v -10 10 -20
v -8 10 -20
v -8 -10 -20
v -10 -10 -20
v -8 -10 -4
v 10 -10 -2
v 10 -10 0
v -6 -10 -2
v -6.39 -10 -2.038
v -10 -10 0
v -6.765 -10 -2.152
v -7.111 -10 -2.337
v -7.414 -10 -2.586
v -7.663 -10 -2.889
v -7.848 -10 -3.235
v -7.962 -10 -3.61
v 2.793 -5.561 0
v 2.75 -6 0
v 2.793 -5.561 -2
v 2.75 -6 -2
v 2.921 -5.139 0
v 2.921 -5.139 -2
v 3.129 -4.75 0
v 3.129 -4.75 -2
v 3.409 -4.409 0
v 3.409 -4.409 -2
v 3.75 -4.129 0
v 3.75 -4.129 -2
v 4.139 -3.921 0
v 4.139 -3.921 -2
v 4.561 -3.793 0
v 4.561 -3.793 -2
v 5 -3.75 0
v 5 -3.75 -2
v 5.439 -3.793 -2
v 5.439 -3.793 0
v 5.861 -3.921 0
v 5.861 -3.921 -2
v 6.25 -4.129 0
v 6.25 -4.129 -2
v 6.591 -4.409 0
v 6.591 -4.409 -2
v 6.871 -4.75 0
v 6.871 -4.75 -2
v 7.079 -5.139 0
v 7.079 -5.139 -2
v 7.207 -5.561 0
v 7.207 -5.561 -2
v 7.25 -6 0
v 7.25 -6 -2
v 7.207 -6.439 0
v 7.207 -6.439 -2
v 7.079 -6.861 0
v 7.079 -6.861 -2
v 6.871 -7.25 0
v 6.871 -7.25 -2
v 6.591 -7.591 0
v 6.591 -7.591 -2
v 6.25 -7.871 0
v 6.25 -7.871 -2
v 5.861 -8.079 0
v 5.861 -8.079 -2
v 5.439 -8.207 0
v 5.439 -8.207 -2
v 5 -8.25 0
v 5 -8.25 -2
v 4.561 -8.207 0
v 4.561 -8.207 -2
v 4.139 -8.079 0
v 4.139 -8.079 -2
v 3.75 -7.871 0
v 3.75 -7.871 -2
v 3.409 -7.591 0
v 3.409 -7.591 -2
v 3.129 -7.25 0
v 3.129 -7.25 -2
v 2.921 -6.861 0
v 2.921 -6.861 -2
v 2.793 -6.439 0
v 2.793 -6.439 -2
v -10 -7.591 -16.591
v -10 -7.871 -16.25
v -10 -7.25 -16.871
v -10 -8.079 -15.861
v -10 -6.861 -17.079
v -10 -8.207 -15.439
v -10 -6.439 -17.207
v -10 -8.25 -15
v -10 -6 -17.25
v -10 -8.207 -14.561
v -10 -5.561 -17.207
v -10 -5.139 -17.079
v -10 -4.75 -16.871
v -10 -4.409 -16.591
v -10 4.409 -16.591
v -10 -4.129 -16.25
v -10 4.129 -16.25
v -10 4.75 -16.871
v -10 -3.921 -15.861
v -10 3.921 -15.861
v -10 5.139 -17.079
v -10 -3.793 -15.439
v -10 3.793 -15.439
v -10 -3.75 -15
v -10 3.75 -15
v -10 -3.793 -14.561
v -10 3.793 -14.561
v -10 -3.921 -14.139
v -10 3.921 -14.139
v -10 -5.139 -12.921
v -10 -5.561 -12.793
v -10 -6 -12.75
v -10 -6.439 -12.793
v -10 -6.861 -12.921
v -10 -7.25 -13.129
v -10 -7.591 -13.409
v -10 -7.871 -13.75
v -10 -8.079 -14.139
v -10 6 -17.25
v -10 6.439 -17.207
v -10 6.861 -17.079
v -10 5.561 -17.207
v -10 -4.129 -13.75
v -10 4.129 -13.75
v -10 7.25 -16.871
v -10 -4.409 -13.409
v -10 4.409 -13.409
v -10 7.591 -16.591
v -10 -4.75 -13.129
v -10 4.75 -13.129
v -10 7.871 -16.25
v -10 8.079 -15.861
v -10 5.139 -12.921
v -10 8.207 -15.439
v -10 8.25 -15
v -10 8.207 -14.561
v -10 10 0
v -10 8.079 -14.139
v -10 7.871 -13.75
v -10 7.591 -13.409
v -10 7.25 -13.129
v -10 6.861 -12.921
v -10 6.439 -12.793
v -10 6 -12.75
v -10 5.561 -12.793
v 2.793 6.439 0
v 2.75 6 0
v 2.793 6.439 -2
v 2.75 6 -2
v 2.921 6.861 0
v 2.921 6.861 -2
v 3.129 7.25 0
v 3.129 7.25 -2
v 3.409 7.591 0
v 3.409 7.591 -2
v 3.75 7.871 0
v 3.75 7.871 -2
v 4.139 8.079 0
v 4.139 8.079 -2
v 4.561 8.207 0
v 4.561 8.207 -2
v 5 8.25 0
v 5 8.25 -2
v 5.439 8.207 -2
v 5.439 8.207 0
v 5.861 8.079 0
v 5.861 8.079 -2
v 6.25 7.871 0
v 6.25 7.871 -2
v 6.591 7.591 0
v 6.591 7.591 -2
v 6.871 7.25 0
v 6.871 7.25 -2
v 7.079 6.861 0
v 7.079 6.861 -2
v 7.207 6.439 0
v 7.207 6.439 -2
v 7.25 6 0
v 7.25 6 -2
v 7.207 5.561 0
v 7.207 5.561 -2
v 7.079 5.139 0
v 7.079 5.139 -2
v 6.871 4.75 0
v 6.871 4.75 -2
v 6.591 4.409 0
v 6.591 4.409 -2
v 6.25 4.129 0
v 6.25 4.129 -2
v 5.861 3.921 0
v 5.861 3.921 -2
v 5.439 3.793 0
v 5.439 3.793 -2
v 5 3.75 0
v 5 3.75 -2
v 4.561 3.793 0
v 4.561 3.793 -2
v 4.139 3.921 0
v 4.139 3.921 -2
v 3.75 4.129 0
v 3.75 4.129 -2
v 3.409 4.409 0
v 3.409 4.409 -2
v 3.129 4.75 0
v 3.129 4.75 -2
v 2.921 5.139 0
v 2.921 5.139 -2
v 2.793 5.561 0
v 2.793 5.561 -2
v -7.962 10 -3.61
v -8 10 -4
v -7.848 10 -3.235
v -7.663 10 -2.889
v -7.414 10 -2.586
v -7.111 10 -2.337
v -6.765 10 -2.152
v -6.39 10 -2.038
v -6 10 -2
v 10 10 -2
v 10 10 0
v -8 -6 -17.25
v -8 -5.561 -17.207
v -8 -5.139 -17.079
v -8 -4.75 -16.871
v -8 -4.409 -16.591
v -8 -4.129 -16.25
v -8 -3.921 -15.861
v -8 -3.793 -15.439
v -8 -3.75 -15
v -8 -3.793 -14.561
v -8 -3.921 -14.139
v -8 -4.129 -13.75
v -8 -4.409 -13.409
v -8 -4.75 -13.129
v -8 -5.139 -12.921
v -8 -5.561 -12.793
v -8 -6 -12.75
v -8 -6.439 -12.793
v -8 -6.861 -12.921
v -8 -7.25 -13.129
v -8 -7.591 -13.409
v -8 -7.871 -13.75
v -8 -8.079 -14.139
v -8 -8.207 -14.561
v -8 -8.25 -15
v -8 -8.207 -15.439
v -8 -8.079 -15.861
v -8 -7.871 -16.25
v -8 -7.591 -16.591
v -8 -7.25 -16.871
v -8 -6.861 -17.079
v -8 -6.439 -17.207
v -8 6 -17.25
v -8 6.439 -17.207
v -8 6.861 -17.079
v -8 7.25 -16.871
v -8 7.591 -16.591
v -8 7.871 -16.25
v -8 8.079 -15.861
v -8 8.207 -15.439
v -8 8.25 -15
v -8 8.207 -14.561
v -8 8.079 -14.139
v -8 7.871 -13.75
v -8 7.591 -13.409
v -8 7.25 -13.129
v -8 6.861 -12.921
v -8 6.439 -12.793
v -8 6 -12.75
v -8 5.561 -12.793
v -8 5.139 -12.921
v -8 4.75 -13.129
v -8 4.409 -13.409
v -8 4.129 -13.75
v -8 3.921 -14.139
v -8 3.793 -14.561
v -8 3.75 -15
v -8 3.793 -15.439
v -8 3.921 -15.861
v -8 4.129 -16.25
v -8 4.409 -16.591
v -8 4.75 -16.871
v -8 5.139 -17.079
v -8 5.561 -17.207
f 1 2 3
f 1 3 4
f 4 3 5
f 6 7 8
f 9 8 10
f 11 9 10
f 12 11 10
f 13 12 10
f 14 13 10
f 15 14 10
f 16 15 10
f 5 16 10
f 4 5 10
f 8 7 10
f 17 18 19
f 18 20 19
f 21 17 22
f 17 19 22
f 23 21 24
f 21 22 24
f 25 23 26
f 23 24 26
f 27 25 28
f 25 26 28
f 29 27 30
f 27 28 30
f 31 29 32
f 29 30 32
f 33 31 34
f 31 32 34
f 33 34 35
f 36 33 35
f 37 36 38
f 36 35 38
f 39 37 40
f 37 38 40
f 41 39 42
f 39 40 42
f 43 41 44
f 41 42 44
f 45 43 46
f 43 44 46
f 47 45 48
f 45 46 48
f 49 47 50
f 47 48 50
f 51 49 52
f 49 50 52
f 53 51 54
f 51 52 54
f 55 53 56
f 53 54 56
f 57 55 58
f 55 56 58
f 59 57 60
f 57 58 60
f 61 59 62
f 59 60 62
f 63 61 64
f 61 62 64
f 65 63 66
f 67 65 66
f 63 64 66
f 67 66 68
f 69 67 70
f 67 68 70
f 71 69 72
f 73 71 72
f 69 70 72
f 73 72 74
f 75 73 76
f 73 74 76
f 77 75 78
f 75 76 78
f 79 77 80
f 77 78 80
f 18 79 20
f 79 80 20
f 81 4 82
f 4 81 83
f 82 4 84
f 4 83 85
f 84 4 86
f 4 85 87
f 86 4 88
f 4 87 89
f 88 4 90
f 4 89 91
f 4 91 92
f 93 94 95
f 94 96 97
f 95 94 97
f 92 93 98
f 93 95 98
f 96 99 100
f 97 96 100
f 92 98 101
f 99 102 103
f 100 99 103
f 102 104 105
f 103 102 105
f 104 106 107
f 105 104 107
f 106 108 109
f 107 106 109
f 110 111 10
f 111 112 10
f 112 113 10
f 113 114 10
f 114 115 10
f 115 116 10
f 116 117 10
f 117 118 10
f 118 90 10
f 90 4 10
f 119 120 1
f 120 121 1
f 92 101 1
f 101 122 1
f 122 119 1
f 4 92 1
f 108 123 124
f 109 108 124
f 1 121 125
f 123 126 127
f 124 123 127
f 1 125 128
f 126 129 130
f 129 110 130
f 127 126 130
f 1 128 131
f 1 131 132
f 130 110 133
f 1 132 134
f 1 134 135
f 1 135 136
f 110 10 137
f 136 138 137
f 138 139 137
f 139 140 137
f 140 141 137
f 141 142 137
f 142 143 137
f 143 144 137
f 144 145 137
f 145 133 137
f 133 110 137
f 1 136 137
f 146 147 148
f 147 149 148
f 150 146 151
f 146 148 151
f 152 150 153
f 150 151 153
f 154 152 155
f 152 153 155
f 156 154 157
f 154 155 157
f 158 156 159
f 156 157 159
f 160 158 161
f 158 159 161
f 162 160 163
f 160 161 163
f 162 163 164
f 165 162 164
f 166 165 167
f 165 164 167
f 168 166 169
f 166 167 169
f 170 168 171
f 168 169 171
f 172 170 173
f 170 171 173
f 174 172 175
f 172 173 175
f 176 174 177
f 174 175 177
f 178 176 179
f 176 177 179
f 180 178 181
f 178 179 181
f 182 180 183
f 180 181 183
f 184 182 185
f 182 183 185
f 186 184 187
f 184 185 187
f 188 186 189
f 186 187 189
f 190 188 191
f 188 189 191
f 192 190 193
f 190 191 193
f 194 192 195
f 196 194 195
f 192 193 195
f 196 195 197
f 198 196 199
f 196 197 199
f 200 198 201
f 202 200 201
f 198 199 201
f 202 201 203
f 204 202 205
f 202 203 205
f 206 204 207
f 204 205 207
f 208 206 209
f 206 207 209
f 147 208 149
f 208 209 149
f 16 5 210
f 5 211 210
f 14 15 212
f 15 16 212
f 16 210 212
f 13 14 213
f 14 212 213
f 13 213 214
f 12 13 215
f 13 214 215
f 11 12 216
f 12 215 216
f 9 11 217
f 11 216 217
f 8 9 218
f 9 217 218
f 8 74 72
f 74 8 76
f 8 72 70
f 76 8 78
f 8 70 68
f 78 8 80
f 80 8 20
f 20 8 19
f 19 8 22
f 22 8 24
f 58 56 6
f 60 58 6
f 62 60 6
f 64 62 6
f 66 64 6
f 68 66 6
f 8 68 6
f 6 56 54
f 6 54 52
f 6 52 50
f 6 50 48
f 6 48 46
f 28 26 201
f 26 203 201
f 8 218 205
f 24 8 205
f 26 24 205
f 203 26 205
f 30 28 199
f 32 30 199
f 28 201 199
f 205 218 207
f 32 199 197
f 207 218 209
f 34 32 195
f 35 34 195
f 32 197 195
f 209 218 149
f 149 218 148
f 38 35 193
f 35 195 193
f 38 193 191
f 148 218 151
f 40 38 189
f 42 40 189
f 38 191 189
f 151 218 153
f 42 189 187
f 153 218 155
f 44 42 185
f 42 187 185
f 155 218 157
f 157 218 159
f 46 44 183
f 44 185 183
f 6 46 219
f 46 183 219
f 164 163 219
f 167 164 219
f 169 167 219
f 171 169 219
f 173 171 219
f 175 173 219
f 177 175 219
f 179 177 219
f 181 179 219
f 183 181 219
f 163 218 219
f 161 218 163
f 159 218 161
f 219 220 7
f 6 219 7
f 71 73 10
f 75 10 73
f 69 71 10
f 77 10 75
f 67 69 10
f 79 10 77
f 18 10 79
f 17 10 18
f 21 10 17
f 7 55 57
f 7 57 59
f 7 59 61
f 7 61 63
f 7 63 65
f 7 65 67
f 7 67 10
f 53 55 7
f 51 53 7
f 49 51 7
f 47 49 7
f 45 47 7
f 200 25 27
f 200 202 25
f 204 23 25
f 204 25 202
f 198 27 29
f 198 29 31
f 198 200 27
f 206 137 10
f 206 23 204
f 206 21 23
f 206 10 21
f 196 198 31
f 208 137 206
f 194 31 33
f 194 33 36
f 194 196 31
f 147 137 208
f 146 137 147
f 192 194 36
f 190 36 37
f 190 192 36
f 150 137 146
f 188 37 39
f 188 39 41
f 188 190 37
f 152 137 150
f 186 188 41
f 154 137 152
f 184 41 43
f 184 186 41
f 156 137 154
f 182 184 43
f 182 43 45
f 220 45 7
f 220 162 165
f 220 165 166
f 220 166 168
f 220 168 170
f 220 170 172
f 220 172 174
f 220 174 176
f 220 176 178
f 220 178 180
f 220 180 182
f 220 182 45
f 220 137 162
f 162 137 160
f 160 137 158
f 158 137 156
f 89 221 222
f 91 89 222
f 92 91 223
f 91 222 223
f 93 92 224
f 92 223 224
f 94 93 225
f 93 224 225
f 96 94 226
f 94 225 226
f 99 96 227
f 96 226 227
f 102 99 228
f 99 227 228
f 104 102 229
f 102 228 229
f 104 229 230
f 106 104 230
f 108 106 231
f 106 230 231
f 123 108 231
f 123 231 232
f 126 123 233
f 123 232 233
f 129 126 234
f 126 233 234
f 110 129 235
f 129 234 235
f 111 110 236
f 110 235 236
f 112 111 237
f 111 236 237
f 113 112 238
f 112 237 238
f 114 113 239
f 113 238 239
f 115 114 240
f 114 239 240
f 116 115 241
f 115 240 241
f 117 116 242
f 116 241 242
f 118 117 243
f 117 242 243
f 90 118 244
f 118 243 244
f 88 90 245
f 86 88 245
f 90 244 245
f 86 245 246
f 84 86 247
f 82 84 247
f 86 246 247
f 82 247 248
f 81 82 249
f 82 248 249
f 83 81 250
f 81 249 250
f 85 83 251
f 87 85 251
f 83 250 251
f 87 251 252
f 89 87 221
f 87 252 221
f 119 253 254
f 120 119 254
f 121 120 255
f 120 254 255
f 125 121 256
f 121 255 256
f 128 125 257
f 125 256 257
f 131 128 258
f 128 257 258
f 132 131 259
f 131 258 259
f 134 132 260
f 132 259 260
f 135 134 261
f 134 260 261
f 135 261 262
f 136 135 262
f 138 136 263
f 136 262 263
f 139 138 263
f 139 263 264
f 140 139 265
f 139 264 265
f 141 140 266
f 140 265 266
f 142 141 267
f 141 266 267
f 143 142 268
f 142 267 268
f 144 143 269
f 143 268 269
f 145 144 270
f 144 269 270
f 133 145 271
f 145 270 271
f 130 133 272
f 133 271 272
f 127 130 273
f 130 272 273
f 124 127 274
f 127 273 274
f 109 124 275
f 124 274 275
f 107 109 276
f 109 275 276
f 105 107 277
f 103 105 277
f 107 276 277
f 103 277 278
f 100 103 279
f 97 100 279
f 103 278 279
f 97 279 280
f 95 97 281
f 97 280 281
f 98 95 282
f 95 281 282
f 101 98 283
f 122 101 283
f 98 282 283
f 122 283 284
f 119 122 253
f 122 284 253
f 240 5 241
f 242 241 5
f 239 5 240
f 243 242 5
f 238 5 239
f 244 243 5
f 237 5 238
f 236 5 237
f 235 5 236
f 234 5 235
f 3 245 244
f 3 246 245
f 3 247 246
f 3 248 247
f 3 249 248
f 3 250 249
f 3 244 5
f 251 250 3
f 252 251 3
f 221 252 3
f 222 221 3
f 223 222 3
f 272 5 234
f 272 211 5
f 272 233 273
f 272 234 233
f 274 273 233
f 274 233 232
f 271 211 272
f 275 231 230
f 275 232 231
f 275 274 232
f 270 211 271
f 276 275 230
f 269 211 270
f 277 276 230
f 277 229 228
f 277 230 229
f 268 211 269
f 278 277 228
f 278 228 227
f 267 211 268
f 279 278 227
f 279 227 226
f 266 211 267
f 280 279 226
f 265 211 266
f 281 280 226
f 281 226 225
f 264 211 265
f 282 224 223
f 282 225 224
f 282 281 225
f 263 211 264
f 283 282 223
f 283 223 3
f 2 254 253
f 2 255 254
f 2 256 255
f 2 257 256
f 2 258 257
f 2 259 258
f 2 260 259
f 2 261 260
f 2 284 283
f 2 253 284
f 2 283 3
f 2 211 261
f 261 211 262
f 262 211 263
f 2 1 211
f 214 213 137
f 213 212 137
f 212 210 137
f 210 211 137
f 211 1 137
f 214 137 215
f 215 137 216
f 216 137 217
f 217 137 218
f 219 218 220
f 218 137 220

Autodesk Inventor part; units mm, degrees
ref_plane "YZ Plane" through (0, 0, 0) normal (1, 0, 0) x (0, 1, 0)
ref_plane "XZ Plane" through (0, 0, 0) normal (0, 1, 0) x (-1, 0, 0)
ref_plane "XY Plane" through (0, 0, 0) normal (0, 0, 1) x (1, 0, 0)
sketch "Sketch1" plane through (0, 0, 0) normal (0, 0, 1) x (1, 0, 0)
  line L0 (-10, 10) -> (10, 10)
  line L1 (10, 10) -> (10, -10)
  line L2 (10, -10) -> (-10, -10)
  line L3 (-10, -10) -> (-10, 10)
  line L4 (-10, 10) -> (10, -10) construction
  line L5 (10, 10) -> (-10, -10) construction
  point P0 (0, 0)
  dimension "d0" = 20
  dimension "d1" = 20
extrude "Extrusion1" add sketch "Sketch1" against normal blind 2
sketch "Sketch2" plane through (-10, 10, 0) normal (0, 1, 0) x (1, 0, 0)
  line L0 (20, 0) -> (0, 0) projected
  line L1 (0, 0) -> (2, 0)
  line L2 (2, 0) -> (2, 20)
  line L3 (2, 20) -> (0, 20)
  line L4 (0, 20) -> (0, 0)
  point P0 (10, 0)
  point P1 (2, 0)
  dimension "d4" = 2
  dimension "d5" = 20
extrude "Extrusion2" add sketch "Sketch2" against normal blind 20
fillet "Fillet1" radius 2 1 edges at (-8, 0, -2)
sketch "Sketch4" plane through (0, 0, -2) normal (0, 0, -1) x (-1, 0, 0)
  circle A0 centre (-5, -6) radius 2.25
  circle A1 centre (-5, 6) radius 2.25
  line L0 (-10, -10) -> (6, -10) projected
  line L1 (6, 10) -> (-10, 10) projected
  line L2 (-10, 10) -> (-10, -10) projected
  point P0 (0, 0)
  point P1 (10, -10)
  dimension "d10" = 4.5
  dimension "d11" = 4.5
  dimension "d12" = 4
  dimension "d13" = 4
  dimension "d15" = 5
  dimension "d16" = 5
  dimension "d33" = 12
extrude "Extrusion3" cut sketch "Sketch4" against normal blind 2
sketch "Sketch5" plane through (-8, -10, -20) normal (1, 0, 0) x (0, 0, -1)
  circle A0 centre (-5, 4) radius 2.25
  circle A1 centre (-5, 16) radius 2.25
  line L0 (0, 0) -> (-16, 0) projected
  line L1 (-16, 20) -> (0, 20) projected
  line L2 (0, 20) -> (0, 0) projected
  point P0 (-20, 10)
  dimension "d19" = 4.5
  dimension "d20" = 4.5
  dimension "d21" = 4
  dimension "d23" = 5
  dimension "d24" = 5
  dimension "d38" = 4
extrude "Extrusion4" cut sketch "Sketch5" against normal blind 2
properties part number "CONTROL_MONTEER"
